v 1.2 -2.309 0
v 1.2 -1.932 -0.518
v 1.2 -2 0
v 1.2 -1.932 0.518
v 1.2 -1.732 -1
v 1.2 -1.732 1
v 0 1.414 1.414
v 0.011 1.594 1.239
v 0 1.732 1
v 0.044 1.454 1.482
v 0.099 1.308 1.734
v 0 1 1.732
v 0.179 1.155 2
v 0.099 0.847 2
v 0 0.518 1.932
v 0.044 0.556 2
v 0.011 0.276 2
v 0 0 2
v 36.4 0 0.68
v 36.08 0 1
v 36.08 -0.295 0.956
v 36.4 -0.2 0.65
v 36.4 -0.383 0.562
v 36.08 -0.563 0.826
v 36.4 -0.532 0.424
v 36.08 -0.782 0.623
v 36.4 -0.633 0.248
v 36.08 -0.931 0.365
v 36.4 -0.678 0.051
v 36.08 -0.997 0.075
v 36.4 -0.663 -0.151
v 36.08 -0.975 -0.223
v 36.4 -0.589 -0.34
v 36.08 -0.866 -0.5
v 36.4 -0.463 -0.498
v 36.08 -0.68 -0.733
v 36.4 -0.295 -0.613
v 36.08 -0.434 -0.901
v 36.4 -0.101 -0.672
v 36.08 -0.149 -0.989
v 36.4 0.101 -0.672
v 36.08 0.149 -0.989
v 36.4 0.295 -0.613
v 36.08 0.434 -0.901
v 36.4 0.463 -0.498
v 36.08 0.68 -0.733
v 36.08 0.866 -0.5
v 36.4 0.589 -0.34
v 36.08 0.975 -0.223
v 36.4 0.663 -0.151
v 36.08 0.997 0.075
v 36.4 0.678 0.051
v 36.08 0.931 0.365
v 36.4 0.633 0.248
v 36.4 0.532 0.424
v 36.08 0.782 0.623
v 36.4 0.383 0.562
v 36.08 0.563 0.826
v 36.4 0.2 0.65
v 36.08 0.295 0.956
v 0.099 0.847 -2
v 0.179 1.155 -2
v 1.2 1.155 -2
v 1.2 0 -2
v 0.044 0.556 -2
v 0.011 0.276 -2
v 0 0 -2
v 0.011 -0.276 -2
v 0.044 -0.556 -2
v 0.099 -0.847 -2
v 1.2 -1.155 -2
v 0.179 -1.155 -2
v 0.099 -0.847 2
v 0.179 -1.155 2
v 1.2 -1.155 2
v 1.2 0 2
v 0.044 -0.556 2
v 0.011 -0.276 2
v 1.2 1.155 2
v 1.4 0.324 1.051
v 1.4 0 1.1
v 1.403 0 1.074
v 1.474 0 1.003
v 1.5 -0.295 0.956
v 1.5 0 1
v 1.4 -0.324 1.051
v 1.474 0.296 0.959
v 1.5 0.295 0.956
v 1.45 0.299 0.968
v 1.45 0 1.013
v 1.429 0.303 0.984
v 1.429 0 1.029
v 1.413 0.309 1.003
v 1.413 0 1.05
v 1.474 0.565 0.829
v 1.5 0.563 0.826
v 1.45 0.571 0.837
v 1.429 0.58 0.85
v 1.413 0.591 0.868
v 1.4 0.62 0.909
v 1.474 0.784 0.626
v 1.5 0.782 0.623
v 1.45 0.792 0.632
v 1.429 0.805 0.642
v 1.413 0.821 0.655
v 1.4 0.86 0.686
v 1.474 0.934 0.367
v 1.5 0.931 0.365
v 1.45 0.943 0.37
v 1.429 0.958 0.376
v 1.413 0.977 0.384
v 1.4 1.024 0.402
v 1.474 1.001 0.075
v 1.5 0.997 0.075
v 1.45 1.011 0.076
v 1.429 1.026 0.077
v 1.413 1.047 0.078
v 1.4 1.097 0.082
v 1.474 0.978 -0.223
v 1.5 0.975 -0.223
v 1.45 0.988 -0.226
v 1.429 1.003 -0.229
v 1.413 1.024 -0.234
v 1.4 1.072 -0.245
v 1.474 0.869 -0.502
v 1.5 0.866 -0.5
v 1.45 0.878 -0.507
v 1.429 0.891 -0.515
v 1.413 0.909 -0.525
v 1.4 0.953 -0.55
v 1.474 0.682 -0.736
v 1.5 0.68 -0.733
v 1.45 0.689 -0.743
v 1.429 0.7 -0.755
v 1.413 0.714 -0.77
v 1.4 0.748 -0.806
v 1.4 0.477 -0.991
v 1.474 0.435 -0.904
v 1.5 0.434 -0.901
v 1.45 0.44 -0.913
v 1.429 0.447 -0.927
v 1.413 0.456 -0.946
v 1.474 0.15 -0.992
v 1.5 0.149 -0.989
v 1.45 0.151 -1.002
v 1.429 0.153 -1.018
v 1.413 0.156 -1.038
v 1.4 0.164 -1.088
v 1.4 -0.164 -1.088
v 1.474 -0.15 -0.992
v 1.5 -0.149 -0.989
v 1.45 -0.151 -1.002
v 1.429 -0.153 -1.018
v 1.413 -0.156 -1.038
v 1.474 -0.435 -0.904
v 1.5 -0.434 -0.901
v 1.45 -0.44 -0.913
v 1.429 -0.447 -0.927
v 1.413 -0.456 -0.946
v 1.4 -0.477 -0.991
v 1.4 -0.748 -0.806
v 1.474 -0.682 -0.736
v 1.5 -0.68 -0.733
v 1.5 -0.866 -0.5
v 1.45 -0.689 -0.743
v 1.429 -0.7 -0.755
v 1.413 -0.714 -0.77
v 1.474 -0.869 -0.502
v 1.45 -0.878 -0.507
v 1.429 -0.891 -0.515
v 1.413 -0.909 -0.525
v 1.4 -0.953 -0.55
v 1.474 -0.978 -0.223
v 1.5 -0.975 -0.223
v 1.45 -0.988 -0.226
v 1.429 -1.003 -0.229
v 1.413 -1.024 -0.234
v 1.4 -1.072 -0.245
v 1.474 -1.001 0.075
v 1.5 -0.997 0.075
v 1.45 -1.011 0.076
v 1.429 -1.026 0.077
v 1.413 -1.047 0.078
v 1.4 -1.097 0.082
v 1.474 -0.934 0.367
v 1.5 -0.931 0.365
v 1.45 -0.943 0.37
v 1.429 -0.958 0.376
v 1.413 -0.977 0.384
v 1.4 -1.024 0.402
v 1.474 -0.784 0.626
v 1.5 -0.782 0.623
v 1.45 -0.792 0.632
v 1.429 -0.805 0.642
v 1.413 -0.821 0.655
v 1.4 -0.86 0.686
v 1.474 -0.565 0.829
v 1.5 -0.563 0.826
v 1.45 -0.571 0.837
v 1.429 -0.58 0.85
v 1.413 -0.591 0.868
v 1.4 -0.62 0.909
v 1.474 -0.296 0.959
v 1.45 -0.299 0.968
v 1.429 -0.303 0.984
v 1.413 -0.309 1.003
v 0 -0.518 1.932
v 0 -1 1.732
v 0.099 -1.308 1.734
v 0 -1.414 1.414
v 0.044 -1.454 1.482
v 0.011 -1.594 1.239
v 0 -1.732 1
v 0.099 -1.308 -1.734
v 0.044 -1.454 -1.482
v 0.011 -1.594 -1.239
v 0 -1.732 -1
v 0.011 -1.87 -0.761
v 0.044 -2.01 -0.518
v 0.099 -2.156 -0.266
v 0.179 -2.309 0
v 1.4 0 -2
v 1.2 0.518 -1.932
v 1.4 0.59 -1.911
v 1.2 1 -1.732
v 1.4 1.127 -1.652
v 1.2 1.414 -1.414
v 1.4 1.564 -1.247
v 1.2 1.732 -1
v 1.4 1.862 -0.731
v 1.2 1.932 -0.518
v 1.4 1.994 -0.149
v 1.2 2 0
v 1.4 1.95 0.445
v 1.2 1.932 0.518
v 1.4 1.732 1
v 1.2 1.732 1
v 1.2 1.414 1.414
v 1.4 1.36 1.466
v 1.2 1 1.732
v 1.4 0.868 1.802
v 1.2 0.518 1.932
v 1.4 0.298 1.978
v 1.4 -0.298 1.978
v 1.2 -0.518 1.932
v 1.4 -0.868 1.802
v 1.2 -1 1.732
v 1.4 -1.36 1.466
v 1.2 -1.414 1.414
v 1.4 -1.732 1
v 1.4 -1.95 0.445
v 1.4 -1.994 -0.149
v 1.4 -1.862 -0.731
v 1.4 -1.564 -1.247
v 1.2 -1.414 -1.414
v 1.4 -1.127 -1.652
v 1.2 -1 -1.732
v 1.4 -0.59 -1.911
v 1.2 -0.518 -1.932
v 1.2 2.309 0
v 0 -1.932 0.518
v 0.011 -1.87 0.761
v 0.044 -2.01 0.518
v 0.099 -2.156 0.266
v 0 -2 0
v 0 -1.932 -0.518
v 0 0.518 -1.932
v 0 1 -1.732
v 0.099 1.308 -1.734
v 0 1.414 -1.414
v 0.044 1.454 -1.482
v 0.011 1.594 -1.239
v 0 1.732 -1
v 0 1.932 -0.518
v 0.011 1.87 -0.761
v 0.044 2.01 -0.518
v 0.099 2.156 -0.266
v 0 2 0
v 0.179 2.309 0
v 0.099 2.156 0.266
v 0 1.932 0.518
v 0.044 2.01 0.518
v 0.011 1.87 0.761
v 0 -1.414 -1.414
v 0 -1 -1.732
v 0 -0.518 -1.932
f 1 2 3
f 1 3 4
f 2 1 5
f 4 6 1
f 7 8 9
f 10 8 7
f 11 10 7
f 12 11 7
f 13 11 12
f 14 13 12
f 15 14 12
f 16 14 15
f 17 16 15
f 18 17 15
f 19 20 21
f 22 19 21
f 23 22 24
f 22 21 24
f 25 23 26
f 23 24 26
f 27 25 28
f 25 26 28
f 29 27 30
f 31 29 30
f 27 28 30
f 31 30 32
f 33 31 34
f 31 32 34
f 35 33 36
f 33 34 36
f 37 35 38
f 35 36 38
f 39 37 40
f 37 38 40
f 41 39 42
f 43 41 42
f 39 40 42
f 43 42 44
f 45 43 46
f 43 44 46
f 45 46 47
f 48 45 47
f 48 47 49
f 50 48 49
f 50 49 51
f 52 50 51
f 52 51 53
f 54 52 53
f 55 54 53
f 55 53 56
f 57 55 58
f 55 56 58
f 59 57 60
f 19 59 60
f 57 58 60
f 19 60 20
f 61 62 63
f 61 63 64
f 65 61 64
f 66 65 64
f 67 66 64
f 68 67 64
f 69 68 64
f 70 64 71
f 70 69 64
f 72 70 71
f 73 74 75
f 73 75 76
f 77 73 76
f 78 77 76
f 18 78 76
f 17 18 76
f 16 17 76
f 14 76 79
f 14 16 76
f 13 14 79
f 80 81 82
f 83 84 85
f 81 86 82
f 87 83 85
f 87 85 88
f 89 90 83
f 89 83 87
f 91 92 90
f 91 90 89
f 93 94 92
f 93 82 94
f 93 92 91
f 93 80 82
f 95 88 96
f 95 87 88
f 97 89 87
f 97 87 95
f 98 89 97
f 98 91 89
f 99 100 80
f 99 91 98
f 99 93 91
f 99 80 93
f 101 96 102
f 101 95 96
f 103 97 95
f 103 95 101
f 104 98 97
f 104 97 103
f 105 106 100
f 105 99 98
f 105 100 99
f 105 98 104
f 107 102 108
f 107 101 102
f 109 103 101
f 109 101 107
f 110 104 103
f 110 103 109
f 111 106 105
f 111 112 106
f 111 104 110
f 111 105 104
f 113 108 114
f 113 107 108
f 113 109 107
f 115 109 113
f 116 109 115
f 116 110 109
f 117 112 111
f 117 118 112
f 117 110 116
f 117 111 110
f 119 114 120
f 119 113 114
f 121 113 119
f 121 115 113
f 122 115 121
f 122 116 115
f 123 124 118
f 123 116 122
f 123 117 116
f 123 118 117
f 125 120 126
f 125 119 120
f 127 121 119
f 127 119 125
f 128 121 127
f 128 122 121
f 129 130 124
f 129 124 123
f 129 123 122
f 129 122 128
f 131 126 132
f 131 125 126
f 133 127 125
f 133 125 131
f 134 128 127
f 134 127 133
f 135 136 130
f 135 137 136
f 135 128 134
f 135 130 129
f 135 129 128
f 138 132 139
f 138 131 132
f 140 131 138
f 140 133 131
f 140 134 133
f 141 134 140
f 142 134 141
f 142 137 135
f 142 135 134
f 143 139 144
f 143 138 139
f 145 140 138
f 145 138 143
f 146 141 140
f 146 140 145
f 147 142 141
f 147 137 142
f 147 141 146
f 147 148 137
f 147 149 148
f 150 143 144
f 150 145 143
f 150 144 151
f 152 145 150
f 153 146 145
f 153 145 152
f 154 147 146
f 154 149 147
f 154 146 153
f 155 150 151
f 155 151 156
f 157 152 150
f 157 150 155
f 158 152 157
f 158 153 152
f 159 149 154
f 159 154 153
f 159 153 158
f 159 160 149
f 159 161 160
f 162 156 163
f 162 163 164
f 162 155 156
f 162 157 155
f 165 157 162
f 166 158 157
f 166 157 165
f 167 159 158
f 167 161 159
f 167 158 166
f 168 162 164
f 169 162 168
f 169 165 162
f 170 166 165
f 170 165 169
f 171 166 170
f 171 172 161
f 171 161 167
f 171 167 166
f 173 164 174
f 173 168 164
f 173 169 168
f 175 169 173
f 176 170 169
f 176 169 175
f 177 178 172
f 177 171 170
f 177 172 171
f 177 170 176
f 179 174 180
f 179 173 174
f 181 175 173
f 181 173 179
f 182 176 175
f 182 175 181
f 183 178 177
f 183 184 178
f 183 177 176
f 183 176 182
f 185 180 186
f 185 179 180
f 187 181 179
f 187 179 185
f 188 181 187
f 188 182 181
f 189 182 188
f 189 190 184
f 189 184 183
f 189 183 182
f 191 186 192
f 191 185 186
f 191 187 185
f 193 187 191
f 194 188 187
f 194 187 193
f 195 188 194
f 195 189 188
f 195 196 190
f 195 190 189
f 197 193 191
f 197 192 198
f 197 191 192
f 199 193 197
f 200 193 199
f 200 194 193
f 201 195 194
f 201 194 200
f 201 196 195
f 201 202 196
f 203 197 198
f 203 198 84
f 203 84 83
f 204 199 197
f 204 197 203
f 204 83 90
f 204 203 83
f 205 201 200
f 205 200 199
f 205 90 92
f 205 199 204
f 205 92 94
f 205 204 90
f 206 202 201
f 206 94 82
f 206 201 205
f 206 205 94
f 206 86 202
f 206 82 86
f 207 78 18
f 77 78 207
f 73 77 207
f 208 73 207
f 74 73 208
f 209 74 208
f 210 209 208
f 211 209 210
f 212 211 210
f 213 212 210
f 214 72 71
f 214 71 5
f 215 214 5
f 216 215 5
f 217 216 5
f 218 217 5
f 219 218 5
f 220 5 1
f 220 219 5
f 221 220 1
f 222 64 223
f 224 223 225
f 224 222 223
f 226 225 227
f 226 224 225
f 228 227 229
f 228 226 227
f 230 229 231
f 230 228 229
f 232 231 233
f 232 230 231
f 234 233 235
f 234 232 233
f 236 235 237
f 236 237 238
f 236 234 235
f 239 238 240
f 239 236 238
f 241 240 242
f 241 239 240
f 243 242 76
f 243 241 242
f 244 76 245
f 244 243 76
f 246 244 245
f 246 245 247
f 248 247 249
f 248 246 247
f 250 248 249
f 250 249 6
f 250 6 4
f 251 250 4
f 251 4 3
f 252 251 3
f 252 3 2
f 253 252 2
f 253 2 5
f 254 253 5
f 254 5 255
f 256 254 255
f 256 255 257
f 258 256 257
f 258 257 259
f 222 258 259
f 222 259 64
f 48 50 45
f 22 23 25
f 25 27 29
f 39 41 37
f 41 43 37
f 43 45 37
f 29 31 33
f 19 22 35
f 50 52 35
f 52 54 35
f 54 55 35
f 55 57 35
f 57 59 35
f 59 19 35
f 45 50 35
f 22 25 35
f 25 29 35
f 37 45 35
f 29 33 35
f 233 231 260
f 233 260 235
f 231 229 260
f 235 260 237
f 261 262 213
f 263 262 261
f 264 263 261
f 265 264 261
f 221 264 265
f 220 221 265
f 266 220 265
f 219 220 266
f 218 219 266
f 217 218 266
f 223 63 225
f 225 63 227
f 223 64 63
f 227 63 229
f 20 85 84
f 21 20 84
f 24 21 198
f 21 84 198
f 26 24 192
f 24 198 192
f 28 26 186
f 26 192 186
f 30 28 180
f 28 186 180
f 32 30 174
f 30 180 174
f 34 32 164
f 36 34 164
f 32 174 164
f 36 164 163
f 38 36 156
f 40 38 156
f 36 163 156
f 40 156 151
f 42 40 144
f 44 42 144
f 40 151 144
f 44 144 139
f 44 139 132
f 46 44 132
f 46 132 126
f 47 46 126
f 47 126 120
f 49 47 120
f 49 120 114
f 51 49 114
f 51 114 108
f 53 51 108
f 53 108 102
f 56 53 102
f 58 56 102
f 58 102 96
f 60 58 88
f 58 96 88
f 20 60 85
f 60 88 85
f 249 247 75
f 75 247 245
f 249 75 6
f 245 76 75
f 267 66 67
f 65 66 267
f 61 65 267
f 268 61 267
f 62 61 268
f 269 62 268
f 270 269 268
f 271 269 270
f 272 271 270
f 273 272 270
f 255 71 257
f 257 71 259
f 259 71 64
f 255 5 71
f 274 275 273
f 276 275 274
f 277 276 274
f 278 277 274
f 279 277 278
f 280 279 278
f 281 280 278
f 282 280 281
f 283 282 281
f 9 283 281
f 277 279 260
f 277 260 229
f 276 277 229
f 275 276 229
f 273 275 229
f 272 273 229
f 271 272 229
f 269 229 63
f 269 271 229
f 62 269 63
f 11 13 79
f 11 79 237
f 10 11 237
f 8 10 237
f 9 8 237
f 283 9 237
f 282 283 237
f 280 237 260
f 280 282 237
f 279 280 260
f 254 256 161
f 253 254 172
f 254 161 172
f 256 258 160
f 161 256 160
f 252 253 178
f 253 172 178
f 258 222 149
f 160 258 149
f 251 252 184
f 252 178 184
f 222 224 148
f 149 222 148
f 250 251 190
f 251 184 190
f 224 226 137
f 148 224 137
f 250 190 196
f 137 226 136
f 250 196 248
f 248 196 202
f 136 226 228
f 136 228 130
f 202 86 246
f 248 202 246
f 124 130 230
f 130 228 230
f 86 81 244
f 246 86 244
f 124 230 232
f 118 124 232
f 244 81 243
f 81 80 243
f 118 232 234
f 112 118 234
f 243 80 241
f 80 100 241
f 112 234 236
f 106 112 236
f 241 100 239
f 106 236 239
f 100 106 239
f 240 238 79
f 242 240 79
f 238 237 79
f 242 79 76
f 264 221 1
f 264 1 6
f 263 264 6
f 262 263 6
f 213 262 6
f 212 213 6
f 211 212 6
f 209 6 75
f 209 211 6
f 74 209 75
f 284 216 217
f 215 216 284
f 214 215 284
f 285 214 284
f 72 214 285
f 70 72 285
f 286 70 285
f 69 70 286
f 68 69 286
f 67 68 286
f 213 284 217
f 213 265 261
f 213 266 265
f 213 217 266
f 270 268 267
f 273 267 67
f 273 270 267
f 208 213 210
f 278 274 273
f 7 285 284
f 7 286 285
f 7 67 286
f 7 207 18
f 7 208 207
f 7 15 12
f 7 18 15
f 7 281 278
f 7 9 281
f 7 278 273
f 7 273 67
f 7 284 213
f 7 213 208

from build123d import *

# Parameters (mm, degrees)
EXTRUDE_360_DEPTH = 1.4
SKETCH_4_W        = 0.2
SKETCH_4_H        = 10.309401077
CHAMFER_1921_SIZE = 0.32
FILLET_1966_R     = 0.1


with BuildPart() as part:
    # 草图1 → Extrude 360 (new body)
    with BuildSketch(Plane(origin=(0, 0, 0), x_dir=(0, 0, -1), z_dir=(1, 0, 0))):
        Polygon((2, 1.154700538), (2, -1.154700538), (0, -2.309401077), (-2, -1.154700538), (-2, 1.154700538), (0, 2.309401077), align=None)
    extrude(amount=EXTRUDE_360_DEPTH)

    # 草图2 → 凸台-旋转1 (revolve)
    with BuildSketch(Plane.XY, mode=Mode.PRIVATE) as revolve_1_sk:
        Polygon((0, 0), (36.4, 0), (36.4, 0.6536), (36.4, 1), (0, 1), align=None)
    revolve(revolve_1_sk.sketch.rotate(Axis((0, 0, 0), (1, 0, 0)), 90), axis=Axis((0, 0, 0), (1, 0, 0)))

    # 草图3 → 切除-旋转1 (revolve, cut)
    with BuildSketch(Plane.XY):
        Polygon((0, 2), (3.065384141, 7.309401077), (3.065384141, 12.309401077), (-10, 12.309401077), (-10, 2), align=None)
    revolve(axis=Axis((0, 0, 0), (1, 0, 0)), mode=Mode.SUBTRACT)

    # 草图5 → 切除-旋转2 (revolve, cut)
    with BuildSketch(Plane.XY):
        Polygon((1.4, 2), (-1.665384141, 7.309401077), (-1.665384141, 12.309401077), (8.334615859, 12.309401077), (8.334615859, 2), align=None)
    revolve(axis=Axis((0, 0, 0), (1, 0, 0)), mode=Mode.SUBTRACT)

    # 草图4 → 切除-旋转3 (revolve, cut)
    with BuildSketch(Plane.XY, mode=Mode.PRIVATE) as cut_revolve_3_sk:
        with Locations((1.3, 7.154700539)):
            Rectangle(SKETCH_4_W, SKETCH_4_H)
    revolve(cut_revolve_3_sk.sketch.rotate(Axis((0, 0, 0), (1, 0, 0)), 270), axis=Axis((0, 0, 0), (1, 0, 0)), mode=Mode.SUBTRACT)

    # Chamfer 1921
    chamfer_1921_edges = [part.edges().sort_by_distance(p)[0] for p in [
        (36.4, 0, -1),
    ]]
    chamfer(chamfer_1921_edges, length=CHAMFER_1921_SIZE)

    # Fillet 1966
    fillet_1966_edges = [part.edges().sort_by_distance(p)[0] for p in [
        (1.4, 0, -1),
    ]]
    fillet(fillet_1966_edges, radius=FILLET_1966_R)


solid = part.part
